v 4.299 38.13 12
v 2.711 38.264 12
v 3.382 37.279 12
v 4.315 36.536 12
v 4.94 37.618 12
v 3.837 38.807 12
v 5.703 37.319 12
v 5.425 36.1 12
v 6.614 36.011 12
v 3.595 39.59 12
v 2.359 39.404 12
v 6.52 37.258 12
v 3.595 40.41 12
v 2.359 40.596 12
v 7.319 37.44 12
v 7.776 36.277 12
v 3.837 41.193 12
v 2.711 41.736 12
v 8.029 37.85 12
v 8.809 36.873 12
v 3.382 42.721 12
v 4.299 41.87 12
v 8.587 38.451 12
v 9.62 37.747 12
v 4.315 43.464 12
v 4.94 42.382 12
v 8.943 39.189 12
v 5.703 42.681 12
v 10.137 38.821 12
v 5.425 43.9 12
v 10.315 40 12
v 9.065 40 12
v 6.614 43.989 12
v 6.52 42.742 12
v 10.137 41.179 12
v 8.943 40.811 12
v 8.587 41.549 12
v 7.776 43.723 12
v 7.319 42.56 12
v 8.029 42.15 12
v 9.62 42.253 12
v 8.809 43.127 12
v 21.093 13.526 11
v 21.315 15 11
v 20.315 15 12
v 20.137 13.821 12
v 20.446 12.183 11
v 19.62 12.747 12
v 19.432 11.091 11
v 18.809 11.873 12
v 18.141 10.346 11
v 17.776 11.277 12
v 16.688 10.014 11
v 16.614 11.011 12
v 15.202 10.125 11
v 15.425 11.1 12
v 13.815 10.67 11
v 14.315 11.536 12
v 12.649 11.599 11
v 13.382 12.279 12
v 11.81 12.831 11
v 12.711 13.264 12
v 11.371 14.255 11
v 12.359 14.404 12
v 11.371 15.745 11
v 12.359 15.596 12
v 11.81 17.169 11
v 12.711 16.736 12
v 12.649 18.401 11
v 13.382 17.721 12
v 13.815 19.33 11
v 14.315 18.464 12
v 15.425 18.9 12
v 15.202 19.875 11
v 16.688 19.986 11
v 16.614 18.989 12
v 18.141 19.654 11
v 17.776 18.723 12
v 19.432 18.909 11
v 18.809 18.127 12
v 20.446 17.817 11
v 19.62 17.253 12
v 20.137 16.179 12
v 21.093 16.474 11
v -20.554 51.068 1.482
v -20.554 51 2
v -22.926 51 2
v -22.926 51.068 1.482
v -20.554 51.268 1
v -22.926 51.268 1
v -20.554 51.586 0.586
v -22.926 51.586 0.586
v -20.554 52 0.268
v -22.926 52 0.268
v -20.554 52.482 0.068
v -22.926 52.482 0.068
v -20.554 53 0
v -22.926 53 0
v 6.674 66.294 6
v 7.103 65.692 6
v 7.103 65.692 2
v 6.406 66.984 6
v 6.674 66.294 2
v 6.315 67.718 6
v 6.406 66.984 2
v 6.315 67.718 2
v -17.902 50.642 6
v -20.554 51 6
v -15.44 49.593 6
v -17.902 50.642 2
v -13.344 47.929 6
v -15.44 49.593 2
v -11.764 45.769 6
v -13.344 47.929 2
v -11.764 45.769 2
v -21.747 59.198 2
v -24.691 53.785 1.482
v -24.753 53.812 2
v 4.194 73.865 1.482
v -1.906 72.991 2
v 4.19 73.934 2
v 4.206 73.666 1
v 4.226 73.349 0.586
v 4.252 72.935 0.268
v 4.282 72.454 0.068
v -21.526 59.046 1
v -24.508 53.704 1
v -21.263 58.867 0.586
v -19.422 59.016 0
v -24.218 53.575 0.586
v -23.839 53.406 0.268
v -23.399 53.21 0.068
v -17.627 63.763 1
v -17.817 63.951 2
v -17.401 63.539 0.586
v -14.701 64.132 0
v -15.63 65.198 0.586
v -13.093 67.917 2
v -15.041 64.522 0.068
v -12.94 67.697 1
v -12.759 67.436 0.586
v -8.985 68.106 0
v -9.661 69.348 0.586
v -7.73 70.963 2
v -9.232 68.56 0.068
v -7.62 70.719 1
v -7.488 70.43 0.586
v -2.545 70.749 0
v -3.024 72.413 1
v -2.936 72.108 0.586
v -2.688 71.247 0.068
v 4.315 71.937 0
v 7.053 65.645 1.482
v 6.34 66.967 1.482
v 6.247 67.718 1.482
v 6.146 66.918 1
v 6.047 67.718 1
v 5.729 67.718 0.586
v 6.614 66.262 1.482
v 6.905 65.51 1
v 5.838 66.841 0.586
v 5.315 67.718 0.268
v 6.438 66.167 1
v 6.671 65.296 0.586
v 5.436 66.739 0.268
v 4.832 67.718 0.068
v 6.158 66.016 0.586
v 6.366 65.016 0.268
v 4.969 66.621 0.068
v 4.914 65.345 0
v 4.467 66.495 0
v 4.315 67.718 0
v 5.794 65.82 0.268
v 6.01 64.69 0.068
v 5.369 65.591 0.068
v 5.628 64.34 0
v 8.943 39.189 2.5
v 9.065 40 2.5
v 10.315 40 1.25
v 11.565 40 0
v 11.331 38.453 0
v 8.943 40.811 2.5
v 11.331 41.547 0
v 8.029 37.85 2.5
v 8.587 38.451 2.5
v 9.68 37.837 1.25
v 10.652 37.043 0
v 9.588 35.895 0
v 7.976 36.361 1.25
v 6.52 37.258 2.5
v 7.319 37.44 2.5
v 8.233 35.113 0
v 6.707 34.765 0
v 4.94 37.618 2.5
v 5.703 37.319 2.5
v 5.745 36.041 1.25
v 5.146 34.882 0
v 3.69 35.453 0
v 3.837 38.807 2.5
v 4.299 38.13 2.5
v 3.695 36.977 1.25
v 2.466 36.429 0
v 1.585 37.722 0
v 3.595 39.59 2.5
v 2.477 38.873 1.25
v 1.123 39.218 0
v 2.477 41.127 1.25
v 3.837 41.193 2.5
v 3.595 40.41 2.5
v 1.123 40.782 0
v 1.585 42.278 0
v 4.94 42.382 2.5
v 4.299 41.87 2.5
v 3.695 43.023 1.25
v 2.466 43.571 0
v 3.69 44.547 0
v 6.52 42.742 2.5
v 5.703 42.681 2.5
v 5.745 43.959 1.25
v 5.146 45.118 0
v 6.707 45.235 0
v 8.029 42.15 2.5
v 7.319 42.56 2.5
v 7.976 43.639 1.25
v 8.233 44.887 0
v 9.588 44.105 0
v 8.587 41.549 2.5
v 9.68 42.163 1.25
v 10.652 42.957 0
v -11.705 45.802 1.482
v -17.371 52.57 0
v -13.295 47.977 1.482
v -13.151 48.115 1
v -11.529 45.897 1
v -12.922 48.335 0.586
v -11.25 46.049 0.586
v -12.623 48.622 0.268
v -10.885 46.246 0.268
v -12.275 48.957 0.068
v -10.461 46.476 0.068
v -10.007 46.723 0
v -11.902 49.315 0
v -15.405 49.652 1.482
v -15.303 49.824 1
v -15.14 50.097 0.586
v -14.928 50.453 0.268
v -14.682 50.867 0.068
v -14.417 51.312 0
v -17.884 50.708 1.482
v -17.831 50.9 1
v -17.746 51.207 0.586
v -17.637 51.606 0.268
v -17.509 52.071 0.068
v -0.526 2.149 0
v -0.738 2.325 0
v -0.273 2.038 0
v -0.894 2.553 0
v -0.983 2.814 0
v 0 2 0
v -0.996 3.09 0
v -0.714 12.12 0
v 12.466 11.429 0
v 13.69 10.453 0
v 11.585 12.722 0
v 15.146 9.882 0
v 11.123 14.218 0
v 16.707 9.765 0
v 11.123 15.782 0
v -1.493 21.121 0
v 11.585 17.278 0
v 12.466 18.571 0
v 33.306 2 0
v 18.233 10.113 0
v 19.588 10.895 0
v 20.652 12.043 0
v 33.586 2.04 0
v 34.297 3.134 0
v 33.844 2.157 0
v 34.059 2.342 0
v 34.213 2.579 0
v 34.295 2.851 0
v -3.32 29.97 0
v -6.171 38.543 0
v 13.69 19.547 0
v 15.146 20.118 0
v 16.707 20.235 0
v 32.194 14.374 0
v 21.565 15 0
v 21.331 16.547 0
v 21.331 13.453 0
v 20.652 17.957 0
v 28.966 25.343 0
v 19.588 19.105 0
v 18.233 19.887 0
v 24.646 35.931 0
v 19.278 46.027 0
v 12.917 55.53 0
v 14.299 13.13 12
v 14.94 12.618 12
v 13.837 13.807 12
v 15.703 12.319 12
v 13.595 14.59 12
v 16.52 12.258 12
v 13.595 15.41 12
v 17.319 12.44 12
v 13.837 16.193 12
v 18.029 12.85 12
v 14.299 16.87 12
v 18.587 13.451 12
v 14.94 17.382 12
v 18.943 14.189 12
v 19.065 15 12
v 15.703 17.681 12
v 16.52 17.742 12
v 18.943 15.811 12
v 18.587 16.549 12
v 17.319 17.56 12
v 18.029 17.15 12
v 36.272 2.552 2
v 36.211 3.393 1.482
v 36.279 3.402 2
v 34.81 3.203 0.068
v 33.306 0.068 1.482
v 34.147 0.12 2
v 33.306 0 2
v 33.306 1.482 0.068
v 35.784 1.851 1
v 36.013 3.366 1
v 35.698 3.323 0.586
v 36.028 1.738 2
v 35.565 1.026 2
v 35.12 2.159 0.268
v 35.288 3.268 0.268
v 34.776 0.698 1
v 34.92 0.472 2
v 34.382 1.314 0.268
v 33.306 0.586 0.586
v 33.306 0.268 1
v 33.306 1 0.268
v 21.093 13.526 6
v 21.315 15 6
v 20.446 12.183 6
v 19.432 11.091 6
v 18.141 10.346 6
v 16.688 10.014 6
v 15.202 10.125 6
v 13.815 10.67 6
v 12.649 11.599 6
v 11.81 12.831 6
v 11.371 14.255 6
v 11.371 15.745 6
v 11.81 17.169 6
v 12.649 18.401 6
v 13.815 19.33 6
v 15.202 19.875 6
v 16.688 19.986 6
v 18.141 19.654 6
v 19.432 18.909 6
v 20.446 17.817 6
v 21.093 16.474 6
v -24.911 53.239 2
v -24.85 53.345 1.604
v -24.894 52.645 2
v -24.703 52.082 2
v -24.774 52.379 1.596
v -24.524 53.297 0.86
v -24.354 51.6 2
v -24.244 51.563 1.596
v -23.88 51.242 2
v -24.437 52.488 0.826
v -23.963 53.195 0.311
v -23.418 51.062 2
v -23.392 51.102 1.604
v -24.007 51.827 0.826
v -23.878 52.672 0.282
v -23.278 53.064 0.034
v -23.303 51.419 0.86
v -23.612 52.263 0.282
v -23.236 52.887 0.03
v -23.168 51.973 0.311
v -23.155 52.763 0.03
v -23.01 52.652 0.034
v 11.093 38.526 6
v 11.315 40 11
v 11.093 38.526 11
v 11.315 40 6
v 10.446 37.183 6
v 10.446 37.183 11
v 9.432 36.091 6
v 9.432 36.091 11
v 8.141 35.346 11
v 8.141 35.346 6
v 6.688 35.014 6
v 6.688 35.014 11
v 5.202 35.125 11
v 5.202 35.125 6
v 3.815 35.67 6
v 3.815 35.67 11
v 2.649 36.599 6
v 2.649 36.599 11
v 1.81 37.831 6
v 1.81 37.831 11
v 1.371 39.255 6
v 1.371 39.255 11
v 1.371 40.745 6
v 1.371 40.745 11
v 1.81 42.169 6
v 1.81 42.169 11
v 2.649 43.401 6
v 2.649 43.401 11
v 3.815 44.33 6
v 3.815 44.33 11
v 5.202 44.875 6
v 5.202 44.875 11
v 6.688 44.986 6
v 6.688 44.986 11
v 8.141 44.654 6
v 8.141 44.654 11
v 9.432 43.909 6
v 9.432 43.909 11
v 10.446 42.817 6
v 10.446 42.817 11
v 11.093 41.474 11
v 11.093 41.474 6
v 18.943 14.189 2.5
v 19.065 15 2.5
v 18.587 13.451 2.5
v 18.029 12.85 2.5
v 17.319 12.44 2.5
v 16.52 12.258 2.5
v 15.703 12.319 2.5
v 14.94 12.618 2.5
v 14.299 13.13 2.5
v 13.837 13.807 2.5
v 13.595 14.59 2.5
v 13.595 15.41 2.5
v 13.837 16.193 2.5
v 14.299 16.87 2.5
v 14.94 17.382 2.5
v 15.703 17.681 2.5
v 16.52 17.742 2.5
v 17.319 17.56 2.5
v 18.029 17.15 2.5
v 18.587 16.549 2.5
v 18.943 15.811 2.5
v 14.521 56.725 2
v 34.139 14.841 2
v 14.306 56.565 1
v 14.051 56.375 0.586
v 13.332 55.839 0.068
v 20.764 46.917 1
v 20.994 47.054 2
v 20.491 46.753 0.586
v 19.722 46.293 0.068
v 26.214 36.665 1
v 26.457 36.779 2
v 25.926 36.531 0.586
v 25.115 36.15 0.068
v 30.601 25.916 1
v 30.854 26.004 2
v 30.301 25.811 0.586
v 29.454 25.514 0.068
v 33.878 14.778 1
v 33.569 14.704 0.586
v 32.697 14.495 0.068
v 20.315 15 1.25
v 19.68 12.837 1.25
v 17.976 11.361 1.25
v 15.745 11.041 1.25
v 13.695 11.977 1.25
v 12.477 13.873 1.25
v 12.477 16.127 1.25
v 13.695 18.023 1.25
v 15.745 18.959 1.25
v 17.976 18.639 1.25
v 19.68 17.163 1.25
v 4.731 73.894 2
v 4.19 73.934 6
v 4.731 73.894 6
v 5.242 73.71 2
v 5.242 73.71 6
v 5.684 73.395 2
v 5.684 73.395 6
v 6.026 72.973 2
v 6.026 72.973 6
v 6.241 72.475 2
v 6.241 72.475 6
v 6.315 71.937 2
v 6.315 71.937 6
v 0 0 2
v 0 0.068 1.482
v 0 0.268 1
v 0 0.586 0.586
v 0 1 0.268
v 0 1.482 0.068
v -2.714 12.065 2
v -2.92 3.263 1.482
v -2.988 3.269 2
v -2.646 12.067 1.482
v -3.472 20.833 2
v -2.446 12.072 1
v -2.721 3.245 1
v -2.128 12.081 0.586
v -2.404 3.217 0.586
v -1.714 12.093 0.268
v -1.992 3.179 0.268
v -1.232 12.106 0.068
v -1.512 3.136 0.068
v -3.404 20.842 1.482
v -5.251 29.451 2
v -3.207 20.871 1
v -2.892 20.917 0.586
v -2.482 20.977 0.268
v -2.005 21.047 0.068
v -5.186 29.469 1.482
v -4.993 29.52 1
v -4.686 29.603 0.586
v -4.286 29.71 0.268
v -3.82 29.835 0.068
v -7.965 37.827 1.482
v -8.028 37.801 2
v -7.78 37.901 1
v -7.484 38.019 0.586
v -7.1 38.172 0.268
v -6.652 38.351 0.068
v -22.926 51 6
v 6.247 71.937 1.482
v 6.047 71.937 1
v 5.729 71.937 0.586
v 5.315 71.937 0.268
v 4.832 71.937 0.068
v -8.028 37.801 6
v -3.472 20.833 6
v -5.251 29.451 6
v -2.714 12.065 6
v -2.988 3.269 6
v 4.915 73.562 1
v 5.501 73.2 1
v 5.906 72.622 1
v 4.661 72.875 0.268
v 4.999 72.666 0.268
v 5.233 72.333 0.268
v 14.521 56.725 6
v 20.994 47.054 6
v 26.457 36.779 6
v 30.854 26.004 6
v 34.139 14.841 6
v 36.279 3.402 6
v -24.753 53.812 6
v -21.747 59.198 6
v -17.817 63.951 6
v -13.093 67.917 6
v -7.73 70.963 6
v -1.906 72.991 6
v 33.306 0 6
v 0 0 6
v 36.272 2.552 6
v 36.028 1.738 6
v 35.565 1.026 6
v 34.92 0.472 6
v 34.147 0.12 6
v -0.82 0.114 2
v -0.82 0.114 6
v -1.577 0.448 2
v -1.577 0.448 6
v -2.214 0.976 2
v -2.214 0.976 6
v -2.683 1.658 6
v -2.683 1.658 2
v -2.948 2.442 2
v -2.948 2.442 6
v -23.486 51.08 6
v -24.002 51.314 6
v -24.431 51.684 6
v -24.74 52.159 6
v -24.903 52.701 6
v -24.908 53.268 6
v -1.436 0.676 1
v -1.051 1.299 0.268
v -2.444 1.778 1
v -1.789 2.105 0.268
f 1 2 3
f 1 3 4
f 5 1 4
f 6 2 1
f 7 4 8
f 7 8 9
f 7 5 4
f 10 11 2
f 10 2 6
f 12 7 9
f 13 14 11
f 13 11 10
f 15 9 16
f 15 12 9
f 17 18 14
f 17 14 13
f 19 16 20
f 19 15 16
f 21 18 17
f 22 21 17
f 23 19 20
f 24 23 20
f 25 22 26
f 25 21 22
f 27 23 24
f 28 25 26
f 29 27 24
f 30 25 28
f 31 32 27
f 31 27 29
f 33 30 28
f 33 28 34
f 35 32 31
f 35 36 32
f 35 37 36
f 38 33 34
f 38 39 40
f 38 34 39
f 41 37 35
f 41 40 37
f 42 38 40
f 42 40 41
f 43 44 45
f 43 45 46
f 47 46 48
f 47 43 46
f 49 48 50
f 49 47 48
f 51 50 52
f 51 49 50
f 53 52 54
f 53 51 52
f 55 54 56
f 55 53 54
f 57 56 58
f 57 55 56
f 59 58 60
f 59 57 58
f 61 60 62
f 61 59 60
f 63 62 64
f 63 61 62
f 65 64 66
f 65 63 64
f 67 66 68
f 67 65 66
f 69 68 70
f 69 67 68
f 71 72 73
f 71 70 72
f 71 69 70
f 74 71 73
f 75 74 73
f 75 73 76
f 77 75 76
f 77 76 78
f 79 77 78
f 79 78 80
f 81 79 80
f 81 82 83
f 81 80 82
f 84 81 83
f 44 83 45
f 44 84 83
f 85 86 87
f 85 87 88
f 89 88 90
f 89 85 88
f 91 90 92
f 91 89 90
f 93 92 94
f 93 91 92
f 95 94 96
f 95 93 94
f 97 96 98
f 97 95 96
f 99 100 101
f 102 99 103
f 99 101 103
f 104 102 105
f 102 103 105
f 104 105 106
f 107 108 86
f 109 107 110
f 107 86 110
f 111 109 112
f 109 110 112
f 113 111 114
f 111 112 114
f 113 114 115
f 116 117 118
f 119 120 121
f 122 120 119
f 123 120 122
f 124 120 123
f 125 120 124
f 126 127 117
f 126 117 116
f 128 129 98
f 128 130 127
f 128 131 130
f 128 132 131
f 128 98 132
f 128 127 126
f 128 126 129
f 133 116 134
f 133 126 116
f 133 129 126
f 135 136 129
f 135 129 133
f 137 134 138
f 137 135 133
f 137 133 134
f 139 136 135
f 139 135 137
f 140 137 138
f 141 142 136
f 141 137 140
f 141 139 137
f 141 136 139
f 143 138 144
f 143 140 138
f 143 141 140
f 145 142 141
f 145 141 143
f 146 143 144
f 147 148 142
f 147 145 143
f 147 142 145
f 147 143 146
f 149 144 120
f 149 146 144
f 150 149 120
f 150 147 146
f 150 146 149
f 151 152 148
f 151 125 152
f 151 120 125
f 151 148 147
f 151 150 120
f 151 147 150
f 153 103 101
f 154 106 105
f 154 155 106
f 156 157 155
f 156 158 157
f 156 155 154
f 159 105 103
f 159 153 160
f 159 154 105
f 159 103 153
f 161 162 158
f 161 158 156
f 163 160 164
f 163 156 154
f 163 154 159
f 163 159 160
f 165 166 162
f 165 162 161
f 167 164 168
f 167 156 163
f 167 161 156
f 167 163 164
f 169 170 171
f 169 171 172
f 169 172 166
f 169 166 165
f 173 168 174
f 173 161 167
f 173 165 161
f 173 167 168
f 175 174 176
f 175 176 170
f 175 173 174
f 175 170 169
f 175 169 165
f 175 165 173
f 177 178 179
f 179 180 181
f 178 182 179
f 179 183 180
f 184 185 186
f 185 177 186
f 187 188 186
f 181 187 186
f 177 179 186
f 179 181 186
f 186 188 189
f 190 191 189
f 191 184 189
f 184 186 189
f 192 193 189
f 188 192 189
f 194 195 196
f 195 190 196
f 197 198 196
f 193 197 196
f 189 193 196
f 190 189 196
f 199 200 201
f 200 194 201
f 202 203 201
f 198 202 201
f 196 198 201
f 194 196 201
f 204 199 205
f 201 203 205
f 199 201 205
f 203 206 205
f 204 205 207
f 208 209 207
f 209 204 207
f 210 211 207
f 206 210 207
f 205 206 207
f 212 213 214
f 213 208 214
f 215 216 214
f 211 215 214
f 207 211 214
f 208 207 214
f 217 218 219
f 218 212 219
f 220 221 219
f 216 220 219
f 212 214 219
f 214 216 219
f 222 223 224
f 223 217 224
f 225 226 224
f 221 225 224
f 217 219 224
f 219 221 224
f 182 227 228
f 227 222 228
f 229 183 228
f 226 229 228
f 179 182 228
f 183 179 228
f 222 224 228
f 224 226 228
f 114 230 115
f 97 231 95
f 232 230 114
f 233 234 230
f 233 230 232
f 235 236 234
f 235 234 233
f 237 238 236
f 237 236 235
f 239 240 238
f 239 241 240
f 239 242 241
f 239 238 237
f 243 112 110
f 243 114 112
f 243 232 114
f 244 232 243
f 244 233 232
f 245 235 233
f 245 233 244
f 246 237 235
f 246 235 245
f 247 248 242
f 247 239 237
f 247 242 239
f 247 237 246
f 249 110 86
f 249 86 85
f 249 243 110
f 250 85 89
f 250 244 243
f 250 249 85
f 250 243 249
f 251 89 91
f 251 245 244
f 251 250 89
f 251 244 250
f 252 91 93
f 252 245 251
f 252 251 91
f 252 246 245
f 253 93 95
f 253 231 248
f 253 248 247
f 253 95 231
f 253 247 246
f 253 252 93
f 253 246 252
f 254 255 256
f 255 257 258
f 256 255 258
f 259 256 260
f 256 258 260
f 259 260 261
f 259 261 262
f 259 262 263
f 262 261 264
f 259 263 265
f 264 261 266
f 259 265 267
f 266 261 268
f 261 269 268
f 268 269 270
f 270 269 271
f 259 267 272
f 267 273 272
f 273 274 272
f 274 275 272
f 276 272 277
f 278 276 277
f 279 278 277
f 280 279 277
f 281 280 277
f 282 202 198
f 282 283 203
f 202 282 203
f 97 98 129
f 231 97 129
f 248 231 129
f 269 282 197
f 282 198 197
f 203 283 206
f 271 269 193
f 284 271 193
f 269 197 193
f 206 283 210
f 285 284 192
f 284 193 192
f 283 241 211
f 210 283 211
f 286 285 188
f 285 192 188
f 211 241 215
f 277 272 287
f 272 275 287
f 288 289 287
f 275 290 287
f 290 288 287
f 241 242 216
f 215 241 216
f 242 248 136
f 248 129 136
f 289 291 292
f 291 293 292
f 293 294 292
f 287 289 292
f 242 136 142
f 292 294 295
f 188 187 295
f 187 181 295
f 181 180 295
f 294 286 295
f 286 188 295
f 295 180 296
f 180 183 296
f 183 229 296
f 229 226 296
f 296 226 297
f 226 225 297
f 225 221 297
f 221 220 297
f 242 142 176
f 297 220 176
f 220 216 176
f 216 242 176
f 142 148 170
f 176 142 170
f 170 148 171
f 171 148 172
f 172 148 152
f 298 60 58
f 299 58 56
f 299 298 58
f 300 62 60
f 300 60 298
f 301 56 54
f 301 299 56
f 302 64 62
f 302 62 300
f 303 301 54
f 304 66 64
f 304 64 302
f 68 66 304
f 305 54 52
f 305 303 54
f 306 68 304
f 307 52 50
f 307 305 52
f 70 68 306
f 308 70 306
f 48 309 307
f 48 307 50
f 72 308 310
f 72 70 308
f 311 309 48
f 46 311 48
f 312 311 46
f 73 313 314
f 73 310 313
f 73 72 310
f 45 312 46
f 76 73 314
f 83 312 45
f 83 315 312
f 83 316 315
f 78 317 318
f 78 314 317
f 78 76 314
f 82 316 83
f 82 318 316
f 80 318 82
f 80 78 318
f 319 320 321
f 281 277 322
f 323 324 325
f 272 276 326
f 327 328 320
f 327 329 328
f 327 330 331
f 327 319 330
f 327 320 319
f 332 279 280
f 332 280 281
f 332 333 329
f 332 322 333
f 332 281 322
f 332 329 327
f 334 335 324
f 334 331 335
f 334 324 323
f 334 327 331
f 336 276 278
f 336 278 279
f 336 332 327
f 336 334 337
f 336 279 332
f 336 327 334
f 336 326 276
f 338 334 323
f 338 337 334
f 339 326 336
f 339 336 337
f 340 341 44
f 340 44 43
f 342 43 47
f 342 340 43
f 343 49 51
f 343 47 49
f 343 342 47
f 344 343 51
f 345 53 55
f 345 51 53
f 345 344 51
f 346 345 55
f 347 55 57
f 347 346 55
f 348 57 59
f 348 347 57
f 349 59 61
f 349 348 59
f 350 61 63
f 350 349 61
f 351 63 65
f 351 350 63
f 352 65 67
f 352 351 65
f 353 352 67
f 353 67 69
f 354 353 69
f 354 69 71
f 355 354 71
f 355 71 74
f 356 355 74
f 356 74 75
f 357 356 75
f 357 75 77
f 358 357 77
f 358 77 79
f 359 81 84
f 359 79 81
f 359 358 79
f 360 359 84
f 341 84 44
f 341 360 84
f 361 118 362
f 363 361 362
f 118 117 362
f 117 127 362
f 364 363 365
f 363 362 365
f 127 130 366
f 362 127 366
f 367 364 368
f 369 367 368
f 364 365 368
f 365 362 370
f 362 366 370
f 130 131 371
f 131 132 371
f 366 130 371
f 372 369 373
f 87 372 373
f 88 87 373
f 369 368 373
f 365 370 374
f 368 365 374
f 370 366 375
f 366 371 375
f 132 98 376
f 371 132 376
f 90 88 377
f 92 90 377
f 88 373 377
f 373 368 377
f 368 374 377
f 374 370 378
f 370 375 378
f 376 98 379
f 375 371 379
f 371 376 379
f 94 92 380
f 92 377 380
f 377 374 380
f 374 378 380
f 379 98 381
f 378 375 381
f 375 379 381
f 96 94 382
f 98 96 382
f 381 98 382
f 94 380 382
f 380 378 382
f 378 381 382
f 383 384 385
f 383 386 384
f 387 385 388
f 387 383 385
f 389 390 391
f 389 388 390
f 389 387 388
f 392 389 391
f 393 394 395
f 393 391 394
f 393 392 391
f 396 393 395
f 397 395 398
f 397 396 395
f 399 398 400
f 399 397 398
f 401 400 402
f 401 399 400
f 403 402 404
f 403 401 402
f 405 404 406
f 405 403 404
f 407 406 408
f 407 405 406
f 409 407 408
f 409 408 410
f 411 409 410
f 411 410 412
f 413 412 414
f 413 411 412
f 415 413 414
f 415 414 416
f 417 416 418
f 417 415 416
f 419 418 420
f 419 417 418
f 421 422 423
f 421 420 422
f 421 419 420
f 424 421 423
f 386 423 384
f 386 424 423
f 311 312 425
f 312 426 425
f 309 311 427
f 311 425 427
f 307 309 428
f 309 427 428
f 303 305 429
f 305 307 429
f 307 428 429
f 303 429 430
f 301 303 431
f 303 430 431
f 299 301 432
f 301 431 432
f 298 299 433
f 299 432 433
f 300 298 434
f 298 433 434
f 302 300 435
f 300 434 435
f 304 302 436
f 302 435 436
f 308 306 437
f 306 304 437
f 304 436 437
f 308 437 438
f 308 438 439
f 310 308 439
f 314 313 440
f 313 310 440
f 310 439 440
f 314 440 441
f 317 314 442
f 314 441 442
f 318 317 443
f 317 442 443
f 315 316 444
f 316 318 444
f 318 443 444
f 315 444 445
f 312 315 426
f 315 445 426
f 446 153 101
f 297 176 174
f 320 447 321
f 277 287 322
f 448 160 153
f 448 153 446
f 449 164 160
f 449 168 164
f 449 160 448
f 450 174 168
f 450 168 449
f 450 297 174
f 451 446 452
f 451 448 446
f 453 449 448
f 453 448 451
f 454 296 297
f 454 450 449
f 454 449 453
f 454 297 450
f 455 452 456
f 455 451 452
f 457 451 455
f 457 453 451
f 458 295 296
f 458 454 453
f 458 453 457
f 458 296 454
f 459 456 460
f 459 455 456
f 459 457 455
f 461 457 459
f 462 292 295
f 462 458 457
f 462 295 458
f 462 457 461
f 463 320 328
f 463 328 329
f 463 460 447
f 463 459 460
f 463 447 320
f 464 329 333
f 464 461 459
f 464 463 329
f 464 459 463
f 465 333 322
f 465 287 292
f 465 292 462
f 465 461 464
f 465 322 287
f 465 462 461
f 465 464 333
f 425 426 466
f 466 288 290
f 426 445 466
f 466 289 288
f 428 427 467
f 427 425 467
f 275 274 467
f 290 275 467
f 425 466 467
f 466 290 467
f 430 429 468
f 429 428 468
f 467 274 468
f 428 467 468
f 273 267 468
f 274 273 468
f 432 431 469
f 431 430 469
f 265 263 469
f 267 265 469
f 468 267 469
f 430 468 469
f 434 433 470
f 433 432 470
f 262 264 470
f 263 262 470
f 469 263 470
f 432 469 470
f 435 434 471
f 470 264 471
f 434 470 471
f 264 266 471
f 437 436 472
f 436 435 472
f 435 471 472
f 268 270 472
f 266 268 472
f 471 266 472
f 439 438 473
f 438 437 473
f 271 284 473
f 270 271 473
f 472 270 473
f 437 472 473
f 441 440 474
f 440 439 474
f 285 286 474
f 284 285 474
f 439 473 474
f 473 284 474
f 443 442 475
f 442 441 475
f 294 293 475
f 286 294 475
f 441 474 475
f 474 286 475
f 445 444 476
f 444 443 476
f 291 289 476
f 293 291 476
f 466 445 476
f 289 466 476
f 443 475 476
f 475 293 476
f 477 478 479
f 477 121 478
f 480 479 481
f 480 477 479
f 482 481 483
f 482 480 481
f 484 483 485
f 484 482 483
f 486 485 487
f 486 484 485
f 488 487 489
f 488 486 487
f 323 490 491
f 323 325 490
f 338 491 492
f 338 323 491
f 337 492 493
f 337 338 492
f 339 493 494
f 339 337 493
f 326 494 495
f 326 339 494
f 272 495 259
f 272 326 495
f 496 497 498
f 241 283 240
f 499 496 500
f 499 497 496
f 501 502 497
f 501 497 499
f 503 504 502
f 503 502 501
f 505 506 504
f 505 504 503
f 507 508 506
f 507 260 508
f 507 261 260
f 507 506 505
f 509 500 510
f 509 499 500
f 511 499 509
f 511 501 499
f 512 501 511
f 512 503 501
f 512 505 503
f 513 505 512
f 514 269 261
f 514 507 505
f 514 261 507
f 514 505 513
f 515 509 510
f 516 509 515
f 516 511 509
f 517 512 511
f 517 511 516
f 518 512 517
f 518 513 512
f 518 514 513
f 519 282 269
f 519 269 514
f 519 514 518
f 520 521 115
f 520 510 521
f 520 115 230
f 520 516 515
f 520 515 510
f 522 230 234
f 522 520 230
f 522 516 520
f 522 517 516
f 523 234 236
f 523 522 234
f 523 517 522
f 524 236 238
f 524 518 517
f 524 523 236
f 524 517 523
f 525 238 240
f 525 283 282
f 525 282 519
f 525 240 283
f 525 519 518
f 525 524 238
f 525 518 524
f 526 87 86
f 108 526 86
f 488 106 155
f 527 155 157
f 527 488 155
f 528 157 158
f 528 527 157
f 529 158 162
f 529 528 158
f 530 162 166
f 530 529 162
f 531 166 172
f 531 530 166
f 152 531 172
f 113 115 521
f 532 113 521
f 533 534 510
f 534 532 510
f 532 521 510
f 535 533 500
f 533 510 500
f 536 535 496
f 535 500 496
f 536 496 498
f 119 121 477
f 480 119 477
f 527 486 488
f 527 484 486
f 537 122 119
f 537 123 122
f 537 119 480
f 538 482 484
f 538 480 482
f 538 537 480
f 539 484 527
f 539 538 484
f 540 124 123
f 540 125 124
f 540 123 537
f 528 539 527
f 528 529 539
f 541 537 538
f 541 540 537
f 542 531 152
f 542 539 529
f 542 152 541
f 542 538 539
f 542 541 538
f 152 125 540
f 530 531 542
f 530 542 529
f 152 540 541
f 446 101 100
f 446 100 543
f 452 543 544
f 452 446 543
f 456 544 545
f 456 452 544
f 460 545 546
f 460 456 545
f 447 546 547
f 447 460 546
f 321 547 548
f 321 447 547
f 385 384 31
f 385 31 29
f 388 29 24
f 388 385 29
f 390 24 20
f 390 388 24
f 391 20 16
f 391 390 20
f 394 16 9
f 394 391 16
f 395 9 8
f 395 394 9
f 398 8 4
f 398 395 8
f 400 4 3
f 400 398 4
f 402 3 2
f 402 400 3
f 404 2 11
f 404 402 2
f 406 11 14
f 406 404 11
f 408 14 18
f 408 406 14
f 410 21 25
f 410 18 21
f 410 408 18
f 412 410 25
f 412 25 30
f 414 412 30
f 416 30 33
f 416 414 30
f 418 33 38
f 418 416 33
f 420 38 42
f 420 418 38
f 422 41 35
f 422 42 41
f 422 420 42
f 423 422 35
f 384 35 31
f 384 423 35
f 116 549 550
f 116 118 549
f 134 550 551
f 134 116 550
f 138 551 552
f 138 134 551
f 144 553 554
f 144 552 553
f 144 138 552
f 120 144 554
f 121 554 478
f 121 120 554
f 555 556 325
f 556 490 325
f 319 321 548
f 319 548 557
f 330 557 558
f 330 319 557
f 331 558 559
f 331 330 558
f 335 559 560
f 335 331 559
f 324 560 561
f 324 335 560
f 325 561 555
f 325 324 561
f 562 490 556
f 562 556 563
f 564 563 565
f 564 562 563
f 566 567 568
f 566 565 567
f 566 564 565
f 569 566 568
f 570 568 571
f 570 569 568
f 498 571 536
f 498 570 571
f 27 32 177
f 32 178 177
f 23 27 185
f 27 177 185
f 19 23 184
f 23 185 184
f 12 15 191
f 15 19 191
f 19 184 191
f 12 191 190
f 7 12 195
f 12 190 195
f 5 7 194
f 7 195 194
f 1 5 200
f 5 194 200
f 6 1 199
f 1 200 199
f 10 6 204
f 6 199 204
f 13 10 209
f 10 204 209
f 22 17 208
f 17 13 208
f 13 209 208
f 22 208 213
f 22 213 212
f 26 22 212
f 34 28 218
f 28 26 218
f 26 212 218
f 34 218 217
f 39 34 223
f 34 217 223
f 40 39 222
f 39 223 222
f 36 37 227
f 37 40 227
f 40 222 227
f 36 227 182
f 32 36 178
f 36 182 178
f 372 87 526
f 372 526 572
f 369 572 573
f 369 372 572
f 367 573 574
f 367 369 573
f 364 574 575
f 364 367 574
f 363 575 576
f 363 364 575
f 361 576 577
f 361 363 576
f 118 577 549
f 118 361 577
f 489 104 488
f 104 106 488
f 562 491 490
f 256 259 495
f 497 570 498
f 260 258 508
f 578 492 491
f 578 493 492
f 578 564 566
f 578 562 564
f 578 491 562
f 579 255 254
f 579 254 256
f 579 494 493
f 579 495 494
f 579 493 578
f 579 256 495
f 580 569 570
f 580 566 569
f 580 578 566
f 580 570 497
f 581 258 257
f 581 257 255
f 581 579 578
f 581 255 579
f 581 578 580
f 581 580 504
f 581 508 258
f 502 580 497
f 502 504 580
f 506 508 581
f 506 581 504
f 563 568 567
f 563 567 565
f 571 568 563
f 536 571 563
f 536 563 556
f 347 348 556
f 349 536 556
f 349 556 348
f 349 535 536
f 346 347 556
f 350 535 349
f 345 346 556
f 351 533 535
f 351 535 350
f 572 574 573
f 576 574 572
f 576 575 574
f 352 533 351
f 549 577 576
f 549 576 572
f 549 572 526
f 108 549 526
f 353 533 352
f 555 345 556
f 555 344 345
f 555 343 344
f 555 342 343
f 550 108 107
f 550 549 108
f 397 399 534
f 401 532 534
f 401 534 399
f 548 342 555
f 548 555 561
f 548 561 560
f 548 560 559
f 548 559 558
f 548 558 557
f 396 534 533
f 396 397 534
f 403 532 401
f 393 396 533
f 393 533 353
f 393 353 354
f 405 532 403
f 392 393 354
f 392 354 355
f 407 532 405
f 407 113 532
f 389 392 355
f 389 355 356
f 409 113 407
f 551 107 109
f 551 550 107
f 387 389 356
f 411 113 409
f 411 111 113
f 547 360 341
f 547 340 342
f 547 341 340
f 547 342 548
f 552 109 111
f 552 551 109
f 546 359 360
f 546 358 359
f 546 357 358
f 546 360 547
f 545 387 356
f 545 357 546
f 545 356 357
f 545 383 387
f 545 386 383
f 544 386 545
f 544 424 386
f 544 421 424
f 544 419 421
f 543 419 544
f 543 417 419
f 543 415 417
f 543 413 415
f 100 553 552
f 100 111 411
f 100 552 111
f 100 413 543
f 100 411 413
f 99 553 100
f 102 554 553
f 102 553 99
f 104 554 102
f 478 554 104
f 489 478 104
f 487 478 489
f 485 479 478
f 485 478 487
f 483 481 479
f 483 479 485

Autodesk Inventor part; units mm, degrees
ref_plane "YZ Plane" through (0, 0, 0) normal (1, 0, 0) x (0, 1, 0)
ref_plane "XZ Plane" through (0, 0, 0) normal (0, 1, 0) x (-1, 0, 0)
ref_plane "XY Plane" through (0, 0, 0) normal (0, 0, 1) x (1, 0, 0)
sketch "Sketch1" plane through (0, 0, 0) normal (0, 0, 1) x (1, 0, 0)
  arc A0 (4.1897, 73.9335) -> (-24.7532, 53.8125) centre (6.3147, 40) ccw
  arc A1 (-24.7532, 53.8125) -> (-22.9256, 51) centre (-22.9256, 53) ccw
  line L0 (-22.9256, 51) -> (-20.5538, 51)
  arc A2 (-11.7644, 45.7692) -> (-20.5538, 51) centre (-20.5538, 41) ccw
  arc A3 (-2.9879, 3.2692) -> (-11.7644, 45.7692) centre (-77.6853, 10) ccw
  arc A4 (-2.9879, 3.2692) -> (0, 0) centre (0, 3) ccw
  line L1 (0, 0) -> (33.3057, 0)
  arc A5 (33.3057, 0) -> (36.2787, 3.4018) centre (33.3057, 3) ccw
  arc A6 (36.2787, 3.4018) -> (7.1029, 65.6915) centre (-77.6853, -12) ccw
  arc A7 (6.3147, 67.7183) -> (7.1029, 65.6915) centre (9.3147, 67.7183) ccw
  line L2 (6.3147, 67.7183) -> (6.3147, 71.9374)
  arc A8 (6.3147, 71.9374) -> (4.1897, 73.9335) centre (4.3147, 71.9374) ccw
  circle A9 centre (6.3147, 40) radius 2.75
  circle A10 centre (16.3147, 15) radius 2.75
extrude "Extrusion1" add sketch "Sketch1" along normal blind 6
fillet "Fillet1" radius 2 12 edges at (26.457, 36.7791, 0) (6.5187, 66.631, 0) (6.3147, 69.8278, 0) (5.684, 73.3952, 0) (-13.0929, 67.9167, 0) (-24.6027, 51.9103, 0) (-21.7397, 51, 0) (-15.4398, 49.5934, 0) (-4.235, 25.1679, 0) (-2.2145, 0.9761, 0) (16.6529, 0, 0) (35.5646, 1.0258, 0)
chamfer "Chamfer1" distance 2.5 angle 45 1 edges at (3.5647, 40, 0)
chamfer "Chamfer2" distance 2.5 angle 45 1 edges at (13.5647, 15, 0)
sketch "Sketch2" plane through (0, 0, 6) normal (0, 0, 1) x (1, 0, 0)
  circle A0 centre (6.3147, 40) radius 2.75
  circle A1 centre (16.3147, 15) radius 2.75
  circle A2 centre (6.3147, 40) radius 5
  circle A3 centre (16.3147, 15) radius 5
  point P0 (0, 0)
extrude "Extrusion2" add sketch "Sketch2" along normal blind 6
chamfer "Chamfer3" distance 1 angle 45 1 edges at (1.3147, 40, 12)
chamfer "Chamfer4" distance 1 angle 45 1 edges at (11.3147, 15, 12)
properties part number "Rukohvat_Desni_4"
